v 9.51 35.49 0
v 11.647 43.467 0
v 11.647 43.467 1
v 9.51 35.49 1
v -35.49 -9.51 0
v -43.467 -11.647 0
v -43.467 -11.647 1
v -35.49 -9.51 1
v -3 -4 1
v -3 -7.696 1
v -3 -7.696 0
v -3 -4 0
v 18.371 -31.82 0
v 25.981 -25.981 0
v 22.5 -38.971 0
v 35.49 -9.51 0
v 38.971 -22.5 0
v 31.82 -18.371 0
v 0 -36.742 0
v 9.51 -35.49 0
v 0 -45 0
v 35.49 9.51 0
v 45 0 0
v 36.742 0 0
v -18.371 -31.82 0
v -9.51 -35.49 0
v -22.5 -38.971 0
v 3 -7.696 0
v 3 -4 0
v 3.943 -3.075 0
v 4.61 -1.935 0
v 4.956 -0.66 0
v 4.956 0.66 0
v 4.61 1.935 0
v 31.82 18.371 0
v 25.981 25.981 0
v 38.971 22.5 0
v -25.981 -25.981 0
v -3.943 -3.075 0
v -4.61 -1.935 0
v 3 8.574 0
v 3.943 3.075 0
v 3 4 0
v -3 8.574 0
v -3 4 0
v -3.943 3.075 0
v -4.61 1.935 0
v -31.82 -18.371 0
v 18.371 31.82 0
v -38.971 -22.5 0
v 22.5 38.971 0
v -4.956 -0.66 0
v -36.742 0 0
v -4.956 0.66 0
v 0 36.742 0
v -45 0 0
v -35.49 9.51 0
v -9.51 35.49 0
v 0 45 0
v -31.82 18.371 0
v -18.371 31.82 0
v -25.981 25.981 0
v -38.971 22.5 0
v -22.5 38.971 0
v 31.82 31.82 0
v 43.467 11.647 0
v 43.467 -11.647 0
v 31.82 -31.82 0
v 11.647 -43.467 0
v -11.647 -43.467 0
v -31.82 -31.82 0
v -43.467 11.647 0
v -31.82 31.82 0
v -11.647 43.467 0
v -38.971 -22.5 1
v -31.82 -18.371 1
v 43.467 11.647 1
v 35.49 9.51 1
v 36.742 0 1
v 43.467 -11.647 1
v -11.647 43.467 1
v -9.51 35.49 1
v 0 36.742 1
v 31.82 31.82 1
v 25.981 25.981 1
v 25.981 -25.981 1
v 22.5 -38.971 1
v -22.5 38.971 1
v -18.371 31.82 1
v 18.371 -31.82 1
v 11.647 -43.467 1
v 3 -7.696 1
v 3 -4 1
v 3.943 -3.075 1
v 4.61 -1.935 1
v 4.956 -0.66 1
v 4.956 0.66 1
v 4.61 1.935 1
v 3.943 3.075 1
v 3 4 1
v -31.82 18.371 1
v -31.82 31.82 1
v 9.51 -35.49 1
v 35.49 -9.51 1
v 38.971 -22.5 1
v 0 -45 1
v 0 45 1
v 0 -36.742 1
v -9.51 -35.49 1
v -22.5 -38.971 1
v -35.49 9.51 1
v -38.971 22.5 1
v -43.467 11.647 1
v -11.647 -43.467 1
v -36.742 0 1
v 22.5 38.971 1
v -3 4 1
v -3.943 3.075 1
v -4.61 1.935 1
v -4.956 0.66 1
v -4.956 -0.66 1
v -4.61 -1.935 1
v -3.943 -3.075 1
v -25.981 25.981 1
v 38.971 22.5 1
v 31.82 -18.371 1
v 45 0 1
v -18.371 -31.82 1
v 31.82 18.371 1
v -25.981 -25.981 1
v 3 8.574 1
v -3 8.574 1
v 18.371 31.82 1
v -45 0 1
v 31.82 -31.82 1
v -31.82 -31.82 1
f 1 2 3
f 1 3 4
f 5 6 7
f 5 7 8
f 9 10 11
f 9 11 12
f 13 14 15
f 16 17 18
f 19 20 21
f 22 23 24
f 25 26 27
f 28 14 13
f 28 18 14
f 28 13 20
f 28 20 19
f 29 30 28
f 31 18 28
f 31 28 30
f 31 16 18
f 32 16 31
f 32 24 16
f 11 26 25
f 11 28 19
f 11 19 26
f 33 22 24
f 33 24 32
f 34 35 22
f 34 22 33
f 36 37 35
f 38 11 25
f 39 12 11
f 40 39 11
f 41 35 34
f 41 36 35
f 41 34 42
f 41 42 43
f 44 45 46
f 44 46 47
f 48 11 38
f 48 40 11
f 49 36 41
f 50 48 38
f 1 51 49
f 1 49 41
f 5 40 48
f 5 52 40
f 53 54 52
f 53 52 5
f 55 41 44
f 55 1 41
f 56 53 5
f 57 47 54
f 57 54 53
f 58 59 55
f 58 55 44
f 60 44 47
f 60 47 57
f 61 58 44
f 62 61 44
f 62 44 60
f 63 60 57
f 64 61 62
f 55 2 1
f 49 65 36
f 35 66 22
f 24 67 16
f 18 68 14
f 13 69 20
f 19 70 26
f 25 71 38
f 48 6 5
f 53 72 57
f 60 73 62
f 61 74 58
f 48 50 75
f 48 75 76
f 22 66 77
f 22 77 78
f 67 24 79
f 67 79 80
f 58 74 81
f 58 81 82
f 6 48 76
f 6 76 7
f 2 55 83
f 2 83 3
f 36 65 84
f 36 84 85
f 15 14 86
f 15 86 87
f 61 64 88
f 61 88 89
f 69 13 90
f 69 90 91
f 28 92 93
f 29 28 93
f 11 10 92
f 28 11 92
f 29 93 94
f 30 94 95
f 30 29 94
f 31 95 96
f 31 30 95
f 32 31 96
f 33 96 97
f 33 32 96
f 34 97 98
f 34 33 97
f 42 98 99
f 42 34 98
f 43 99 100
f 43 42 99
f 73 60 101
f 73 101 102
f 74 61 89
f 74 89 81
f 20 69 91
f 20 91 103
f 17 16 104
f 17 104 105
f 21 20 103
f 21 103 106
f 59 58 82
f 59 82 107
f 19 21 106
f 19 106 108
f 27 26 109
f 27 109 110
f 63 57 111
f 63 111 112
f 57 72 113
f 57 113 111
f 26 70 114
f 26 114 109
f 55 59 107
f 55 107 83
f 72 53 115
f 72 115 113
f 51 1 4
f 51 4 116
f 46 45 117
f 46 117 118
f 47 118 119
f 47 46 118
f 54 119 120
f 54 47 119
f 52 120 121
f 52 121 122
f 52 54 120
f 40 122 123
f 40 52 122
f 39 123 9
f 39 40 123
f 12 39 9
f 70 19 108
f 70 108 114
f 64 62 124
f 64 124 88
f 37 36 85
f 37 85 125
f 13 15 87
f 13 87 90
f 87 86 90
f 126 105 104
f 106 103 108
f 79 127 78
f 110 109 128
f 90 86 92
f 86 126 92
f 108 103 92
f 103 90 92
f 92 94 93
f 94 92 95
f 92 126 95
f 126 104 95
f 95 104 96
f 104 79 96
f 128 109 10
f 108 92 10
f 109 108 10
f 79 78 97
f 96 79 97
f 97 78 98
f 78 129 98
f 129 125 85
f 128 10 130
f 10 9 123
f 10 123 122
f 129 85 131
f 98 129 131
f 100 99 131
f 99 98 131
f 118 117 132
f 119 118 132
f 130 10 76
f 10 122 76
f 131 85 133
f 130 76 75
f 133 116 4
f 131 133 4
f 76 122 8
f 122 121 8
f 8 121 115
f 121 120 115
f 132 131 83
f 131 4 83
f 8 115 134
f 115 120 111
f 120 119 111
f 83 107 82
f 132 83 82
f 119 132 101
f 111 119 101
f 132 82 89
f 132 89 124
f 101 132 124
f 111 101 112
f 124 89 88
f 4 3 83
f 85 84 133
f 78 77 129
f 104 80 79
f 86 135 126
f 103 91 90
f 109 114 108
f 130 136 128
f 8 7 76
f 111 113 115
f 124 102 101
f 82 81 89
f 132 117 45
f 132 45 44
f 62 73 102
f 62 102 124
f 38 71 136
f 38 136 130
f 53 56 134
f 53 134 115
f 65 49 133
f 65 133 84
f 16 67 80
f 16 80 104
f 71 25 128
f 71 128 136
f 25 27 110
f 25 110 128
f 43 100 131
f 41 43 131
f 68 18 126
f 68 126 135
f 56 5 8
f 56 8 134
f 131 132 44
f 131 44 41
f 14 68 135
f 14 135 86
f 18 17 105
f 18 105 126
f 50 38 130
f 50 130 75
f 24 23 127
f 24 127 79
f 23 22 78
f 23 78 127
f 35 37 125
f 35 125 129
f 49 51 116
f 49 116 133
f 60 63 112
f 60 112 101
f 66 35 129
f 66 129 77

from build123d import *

# Parameters (mm, degrees)
SKETCH1_R           = 5
BOSS_EXTRUDE1_DEPTH = 1
SKETCH3_W           = 6
SKETCH3_H           = 16.269445872
CUT_EXTRUDE1_DEPTH  = 10


with BuildPart() as part:
    # Sketch1 → Boss-Extrude1 (new body)
    with BuildSketch(Plane.XY):
        Polygon((0, 45), (0, 36.742346142), (11.64685703, 43.466662183), (9.509618943, 35.490381057), (22.5, 38.97114317), (18.371173071, 31.819805153), (31.819805153, 31.819805153), (25.980762114, 25.980762114), (38.97114317, 22.5), (31.819805153, 18.371173071), (43.466662183, 11.64685703), (35.490381057, 9.509618943), (45, 0), (36.742346142, 0), (43.466662183, -11.64685703), (35.490381057, -9.509618943), (38.97114317, -22.5), (31.819805153, -18.371173071), (31.819805153, -31.819805153), (25.980762114, -25.980762114), (22.5, -38.97114317), (18.371173071, -31.819805153), (11.64685703, -43.466662183), (9.509618943, -35.490381057), (0, -45), (0, -36.742346142), (-11.64685703, -43.466662183), (-9.509618943, -35.490381057), (-22.5, -38.97114317), (-18.371173071, -31.819805153), (-31.819805153, -31.819805153), (-25.980762114, -25.980762114), (-38.97114317, -22.5), (-31.819805153, -18.371173071), (-43.466662183, -11.64685703), (-35.490381057, -9.509618943), (-45, 0), (-36.742346142, 0), (-43.466662183, 11.64685703), (-35.490381057, 9.509618943), (-38.97114317, 22.5), (-31.819805153, 18.371173071), (-31.819805153, 31.819805153), (-25.980762114, 25.980762114), (-22.5, 38.97114317), (-18.371173071, 31.819805153), (-11.64685703, 43.466662183), (-9.509618943, 35.490381057), align=None)
        Circle(SKETCH1_R, mode=Mode.SUBTRACT)
    extrude(amount=BOSS_EXTRUDE1_DEPTH)

    # Sketch3 → Cut-Extrude1 (cut)
    with BuildSketch(Plane.XY.offset(1)):
        with Locations((0, 0.439123073)):
            Rectangle(SKETCH3_W, SKETCH3_H)
    extrude(amount=-CUT_EXTRUDE1_DEPTH, mode=Mode.SUBTRACT)


solid = part.part
